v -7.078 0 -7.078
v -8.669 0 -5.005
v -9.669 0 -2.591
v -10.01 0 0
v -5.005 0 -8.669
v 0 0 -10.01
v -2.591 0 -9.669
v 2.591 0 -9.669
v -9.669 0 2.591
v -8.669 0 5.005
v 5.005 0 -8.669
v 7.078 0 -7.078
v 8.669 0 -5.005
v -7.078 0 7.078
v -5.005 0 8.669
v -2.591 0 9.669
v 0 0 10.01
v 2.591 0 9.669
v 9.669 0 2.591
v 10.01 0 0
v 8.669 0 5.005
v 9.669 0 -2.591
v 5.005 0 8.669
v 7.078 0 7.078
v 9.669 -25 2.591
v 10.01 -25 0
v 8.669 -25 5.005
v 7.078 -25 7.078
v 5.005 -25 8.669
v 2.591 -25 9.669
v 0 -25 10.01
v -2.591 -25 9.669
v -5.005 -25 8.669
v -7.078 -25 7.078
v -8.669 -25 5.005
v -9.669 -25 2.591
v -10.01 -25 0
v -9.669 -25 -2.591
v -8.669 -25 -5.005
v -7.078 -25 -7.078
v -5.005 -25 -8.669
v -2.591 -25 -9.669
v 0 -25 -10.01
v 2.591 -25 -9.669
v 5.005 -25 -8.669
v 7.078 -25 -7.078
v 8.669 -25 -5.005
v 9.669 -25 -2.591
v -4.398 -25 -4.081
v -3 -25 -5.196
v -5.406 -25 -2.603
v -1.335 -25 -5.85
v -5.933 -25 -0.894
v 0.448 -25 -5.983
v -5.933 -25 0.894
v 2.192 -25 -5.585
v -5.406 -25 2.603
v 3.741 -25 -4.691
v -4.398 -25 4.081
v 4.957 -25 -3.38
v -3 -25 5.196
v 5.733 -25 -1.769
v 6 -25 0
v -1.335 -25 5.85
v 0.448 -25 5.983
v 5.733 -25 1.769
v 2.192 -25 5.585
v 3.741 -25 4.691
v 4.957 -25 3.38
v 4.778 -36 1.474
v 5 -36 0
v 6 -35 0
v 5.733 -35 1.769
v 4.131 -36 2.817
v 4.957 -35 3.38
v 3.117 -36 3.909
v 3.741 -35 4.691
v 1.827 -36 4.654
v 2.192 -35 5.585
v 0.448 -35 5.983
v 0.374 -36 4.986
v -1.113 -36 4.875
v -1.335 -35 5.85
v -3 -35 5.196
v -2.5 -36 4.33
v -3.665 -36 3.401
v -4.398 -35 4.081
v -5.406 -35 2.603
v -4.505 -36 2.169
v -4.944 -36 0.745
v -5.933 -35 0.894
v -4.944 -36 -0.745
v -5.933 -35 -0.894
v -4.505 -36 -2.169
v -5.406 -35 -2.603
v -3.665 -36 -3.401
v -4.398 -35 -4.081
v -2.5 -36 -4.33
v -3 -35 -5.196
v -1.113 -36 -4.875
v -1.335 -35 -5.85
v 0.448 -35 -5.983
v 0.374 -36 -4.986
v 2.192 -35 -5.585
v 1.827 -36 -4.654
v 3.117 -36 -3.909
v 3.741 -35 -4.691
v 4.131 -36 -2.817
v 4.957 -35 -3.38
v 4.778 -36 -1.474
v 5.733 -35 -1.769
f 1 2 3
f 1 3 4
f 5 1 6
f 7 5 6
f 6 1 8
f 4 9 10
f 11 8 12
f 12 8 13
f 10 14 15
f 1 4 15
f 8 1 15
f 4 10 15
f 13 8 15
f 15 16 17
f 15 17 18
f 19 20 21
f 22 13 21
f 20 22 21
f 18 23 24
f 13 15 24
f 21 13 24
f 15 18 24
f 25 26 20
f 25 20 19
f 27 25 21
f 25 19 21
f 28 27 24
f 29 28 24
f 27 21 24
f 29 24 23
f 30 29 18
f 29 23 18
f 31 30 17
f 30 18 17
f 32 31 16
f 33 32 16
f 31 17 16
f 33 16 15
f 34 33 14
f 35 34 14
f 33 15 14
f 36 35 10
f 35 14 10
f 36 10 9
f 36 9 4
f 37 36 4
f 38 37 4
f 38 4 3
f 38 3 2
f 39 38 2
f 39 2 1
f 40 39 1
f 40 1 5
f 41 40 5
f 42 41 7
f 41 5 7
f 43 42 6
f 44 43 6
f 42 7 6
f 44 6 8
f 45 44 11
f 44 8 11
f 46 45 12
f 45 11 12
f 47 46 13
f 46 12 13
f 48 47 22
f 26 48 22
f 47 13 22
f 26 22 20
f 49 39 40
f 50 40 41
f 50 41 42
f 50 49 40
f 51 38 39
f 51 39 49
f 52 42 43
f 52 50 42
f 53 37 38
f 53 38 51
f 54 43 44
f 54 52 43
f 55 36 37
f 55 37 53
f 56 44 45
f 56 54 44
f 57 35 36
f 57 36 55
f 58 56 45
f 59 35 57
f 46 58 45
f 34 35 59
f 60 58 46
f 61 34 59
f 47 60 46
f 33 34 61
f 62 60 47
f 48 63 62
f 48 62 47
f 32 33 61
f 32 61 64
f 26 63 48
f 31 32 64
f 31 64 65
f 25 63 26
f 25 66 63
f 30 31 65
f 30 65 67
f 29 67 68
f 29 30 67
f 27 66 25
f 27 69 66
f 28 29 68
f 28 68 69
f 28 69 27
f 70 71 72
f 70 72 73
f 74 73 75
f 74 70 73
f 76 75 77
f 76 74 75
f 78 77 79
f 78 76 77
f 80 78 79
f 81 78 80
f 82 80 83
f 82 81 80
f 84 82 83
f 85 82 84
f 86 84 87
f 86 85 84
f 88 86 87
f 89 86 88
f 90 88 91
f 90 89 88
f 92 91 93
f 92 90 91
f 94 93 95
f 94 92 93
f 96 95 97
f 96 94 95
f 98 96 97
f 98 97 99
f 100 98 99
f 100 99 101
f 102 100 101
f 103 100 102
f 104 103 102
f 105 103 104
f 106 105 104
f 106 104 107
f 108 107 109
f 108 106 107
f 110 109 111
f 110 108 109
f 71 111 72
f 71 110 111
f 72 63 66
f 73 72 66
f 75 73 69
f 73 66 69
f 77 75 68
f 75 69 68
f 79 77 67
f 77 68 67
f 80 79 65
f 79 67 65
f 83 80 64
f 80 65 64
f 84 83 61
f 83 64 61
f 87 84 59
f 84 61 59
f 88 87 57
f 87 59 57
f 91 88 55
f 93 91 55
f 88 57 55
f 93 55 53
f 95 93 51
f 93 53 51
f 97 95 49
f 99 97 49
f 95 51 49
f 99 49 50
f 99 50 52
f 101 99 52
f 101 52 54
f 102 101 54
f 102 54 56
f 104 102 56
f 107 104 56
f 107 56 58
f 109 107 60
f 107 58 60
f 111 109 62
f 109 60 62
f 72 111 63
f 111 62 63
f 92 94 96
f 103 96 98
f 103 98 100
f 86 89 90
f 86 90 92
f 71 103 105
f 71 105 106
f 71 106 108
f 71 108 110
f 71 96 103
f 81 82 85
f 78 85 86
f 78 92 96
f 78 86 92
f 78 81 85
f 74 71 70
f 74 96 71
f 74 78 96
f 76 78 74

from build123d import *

# Parameters (mm, degrees)
F0_R     = 10.01
F1_DEPTH = 25
F2_R     = 6
F3_DEPTH = 11
F4_SIZE2 = 1
F4_SIZE  = 1


with BuildPart() as f1:
    # F0 (on Front) → F1 (new body)
    with BuildSketch(Plane.XZ):
        Circle(F0_R)
    extrude(amount=F1_DEPTH)

    # F2 (on face) → F3 (join)
    with BuildSketch(Plane.XZ.offset(25)):
        Circle(F2_R)
    extrude(amount=F3_DEPTH)

    # F4
    f4_edges = [f1.edges().sort_by_distance(p)[0] for p in [
        (-6, -36, 0),
    ]]
    chamfer(f4_edges, length=F4_SIZE, length2=F4_SIZE2)


solid = f1.part
